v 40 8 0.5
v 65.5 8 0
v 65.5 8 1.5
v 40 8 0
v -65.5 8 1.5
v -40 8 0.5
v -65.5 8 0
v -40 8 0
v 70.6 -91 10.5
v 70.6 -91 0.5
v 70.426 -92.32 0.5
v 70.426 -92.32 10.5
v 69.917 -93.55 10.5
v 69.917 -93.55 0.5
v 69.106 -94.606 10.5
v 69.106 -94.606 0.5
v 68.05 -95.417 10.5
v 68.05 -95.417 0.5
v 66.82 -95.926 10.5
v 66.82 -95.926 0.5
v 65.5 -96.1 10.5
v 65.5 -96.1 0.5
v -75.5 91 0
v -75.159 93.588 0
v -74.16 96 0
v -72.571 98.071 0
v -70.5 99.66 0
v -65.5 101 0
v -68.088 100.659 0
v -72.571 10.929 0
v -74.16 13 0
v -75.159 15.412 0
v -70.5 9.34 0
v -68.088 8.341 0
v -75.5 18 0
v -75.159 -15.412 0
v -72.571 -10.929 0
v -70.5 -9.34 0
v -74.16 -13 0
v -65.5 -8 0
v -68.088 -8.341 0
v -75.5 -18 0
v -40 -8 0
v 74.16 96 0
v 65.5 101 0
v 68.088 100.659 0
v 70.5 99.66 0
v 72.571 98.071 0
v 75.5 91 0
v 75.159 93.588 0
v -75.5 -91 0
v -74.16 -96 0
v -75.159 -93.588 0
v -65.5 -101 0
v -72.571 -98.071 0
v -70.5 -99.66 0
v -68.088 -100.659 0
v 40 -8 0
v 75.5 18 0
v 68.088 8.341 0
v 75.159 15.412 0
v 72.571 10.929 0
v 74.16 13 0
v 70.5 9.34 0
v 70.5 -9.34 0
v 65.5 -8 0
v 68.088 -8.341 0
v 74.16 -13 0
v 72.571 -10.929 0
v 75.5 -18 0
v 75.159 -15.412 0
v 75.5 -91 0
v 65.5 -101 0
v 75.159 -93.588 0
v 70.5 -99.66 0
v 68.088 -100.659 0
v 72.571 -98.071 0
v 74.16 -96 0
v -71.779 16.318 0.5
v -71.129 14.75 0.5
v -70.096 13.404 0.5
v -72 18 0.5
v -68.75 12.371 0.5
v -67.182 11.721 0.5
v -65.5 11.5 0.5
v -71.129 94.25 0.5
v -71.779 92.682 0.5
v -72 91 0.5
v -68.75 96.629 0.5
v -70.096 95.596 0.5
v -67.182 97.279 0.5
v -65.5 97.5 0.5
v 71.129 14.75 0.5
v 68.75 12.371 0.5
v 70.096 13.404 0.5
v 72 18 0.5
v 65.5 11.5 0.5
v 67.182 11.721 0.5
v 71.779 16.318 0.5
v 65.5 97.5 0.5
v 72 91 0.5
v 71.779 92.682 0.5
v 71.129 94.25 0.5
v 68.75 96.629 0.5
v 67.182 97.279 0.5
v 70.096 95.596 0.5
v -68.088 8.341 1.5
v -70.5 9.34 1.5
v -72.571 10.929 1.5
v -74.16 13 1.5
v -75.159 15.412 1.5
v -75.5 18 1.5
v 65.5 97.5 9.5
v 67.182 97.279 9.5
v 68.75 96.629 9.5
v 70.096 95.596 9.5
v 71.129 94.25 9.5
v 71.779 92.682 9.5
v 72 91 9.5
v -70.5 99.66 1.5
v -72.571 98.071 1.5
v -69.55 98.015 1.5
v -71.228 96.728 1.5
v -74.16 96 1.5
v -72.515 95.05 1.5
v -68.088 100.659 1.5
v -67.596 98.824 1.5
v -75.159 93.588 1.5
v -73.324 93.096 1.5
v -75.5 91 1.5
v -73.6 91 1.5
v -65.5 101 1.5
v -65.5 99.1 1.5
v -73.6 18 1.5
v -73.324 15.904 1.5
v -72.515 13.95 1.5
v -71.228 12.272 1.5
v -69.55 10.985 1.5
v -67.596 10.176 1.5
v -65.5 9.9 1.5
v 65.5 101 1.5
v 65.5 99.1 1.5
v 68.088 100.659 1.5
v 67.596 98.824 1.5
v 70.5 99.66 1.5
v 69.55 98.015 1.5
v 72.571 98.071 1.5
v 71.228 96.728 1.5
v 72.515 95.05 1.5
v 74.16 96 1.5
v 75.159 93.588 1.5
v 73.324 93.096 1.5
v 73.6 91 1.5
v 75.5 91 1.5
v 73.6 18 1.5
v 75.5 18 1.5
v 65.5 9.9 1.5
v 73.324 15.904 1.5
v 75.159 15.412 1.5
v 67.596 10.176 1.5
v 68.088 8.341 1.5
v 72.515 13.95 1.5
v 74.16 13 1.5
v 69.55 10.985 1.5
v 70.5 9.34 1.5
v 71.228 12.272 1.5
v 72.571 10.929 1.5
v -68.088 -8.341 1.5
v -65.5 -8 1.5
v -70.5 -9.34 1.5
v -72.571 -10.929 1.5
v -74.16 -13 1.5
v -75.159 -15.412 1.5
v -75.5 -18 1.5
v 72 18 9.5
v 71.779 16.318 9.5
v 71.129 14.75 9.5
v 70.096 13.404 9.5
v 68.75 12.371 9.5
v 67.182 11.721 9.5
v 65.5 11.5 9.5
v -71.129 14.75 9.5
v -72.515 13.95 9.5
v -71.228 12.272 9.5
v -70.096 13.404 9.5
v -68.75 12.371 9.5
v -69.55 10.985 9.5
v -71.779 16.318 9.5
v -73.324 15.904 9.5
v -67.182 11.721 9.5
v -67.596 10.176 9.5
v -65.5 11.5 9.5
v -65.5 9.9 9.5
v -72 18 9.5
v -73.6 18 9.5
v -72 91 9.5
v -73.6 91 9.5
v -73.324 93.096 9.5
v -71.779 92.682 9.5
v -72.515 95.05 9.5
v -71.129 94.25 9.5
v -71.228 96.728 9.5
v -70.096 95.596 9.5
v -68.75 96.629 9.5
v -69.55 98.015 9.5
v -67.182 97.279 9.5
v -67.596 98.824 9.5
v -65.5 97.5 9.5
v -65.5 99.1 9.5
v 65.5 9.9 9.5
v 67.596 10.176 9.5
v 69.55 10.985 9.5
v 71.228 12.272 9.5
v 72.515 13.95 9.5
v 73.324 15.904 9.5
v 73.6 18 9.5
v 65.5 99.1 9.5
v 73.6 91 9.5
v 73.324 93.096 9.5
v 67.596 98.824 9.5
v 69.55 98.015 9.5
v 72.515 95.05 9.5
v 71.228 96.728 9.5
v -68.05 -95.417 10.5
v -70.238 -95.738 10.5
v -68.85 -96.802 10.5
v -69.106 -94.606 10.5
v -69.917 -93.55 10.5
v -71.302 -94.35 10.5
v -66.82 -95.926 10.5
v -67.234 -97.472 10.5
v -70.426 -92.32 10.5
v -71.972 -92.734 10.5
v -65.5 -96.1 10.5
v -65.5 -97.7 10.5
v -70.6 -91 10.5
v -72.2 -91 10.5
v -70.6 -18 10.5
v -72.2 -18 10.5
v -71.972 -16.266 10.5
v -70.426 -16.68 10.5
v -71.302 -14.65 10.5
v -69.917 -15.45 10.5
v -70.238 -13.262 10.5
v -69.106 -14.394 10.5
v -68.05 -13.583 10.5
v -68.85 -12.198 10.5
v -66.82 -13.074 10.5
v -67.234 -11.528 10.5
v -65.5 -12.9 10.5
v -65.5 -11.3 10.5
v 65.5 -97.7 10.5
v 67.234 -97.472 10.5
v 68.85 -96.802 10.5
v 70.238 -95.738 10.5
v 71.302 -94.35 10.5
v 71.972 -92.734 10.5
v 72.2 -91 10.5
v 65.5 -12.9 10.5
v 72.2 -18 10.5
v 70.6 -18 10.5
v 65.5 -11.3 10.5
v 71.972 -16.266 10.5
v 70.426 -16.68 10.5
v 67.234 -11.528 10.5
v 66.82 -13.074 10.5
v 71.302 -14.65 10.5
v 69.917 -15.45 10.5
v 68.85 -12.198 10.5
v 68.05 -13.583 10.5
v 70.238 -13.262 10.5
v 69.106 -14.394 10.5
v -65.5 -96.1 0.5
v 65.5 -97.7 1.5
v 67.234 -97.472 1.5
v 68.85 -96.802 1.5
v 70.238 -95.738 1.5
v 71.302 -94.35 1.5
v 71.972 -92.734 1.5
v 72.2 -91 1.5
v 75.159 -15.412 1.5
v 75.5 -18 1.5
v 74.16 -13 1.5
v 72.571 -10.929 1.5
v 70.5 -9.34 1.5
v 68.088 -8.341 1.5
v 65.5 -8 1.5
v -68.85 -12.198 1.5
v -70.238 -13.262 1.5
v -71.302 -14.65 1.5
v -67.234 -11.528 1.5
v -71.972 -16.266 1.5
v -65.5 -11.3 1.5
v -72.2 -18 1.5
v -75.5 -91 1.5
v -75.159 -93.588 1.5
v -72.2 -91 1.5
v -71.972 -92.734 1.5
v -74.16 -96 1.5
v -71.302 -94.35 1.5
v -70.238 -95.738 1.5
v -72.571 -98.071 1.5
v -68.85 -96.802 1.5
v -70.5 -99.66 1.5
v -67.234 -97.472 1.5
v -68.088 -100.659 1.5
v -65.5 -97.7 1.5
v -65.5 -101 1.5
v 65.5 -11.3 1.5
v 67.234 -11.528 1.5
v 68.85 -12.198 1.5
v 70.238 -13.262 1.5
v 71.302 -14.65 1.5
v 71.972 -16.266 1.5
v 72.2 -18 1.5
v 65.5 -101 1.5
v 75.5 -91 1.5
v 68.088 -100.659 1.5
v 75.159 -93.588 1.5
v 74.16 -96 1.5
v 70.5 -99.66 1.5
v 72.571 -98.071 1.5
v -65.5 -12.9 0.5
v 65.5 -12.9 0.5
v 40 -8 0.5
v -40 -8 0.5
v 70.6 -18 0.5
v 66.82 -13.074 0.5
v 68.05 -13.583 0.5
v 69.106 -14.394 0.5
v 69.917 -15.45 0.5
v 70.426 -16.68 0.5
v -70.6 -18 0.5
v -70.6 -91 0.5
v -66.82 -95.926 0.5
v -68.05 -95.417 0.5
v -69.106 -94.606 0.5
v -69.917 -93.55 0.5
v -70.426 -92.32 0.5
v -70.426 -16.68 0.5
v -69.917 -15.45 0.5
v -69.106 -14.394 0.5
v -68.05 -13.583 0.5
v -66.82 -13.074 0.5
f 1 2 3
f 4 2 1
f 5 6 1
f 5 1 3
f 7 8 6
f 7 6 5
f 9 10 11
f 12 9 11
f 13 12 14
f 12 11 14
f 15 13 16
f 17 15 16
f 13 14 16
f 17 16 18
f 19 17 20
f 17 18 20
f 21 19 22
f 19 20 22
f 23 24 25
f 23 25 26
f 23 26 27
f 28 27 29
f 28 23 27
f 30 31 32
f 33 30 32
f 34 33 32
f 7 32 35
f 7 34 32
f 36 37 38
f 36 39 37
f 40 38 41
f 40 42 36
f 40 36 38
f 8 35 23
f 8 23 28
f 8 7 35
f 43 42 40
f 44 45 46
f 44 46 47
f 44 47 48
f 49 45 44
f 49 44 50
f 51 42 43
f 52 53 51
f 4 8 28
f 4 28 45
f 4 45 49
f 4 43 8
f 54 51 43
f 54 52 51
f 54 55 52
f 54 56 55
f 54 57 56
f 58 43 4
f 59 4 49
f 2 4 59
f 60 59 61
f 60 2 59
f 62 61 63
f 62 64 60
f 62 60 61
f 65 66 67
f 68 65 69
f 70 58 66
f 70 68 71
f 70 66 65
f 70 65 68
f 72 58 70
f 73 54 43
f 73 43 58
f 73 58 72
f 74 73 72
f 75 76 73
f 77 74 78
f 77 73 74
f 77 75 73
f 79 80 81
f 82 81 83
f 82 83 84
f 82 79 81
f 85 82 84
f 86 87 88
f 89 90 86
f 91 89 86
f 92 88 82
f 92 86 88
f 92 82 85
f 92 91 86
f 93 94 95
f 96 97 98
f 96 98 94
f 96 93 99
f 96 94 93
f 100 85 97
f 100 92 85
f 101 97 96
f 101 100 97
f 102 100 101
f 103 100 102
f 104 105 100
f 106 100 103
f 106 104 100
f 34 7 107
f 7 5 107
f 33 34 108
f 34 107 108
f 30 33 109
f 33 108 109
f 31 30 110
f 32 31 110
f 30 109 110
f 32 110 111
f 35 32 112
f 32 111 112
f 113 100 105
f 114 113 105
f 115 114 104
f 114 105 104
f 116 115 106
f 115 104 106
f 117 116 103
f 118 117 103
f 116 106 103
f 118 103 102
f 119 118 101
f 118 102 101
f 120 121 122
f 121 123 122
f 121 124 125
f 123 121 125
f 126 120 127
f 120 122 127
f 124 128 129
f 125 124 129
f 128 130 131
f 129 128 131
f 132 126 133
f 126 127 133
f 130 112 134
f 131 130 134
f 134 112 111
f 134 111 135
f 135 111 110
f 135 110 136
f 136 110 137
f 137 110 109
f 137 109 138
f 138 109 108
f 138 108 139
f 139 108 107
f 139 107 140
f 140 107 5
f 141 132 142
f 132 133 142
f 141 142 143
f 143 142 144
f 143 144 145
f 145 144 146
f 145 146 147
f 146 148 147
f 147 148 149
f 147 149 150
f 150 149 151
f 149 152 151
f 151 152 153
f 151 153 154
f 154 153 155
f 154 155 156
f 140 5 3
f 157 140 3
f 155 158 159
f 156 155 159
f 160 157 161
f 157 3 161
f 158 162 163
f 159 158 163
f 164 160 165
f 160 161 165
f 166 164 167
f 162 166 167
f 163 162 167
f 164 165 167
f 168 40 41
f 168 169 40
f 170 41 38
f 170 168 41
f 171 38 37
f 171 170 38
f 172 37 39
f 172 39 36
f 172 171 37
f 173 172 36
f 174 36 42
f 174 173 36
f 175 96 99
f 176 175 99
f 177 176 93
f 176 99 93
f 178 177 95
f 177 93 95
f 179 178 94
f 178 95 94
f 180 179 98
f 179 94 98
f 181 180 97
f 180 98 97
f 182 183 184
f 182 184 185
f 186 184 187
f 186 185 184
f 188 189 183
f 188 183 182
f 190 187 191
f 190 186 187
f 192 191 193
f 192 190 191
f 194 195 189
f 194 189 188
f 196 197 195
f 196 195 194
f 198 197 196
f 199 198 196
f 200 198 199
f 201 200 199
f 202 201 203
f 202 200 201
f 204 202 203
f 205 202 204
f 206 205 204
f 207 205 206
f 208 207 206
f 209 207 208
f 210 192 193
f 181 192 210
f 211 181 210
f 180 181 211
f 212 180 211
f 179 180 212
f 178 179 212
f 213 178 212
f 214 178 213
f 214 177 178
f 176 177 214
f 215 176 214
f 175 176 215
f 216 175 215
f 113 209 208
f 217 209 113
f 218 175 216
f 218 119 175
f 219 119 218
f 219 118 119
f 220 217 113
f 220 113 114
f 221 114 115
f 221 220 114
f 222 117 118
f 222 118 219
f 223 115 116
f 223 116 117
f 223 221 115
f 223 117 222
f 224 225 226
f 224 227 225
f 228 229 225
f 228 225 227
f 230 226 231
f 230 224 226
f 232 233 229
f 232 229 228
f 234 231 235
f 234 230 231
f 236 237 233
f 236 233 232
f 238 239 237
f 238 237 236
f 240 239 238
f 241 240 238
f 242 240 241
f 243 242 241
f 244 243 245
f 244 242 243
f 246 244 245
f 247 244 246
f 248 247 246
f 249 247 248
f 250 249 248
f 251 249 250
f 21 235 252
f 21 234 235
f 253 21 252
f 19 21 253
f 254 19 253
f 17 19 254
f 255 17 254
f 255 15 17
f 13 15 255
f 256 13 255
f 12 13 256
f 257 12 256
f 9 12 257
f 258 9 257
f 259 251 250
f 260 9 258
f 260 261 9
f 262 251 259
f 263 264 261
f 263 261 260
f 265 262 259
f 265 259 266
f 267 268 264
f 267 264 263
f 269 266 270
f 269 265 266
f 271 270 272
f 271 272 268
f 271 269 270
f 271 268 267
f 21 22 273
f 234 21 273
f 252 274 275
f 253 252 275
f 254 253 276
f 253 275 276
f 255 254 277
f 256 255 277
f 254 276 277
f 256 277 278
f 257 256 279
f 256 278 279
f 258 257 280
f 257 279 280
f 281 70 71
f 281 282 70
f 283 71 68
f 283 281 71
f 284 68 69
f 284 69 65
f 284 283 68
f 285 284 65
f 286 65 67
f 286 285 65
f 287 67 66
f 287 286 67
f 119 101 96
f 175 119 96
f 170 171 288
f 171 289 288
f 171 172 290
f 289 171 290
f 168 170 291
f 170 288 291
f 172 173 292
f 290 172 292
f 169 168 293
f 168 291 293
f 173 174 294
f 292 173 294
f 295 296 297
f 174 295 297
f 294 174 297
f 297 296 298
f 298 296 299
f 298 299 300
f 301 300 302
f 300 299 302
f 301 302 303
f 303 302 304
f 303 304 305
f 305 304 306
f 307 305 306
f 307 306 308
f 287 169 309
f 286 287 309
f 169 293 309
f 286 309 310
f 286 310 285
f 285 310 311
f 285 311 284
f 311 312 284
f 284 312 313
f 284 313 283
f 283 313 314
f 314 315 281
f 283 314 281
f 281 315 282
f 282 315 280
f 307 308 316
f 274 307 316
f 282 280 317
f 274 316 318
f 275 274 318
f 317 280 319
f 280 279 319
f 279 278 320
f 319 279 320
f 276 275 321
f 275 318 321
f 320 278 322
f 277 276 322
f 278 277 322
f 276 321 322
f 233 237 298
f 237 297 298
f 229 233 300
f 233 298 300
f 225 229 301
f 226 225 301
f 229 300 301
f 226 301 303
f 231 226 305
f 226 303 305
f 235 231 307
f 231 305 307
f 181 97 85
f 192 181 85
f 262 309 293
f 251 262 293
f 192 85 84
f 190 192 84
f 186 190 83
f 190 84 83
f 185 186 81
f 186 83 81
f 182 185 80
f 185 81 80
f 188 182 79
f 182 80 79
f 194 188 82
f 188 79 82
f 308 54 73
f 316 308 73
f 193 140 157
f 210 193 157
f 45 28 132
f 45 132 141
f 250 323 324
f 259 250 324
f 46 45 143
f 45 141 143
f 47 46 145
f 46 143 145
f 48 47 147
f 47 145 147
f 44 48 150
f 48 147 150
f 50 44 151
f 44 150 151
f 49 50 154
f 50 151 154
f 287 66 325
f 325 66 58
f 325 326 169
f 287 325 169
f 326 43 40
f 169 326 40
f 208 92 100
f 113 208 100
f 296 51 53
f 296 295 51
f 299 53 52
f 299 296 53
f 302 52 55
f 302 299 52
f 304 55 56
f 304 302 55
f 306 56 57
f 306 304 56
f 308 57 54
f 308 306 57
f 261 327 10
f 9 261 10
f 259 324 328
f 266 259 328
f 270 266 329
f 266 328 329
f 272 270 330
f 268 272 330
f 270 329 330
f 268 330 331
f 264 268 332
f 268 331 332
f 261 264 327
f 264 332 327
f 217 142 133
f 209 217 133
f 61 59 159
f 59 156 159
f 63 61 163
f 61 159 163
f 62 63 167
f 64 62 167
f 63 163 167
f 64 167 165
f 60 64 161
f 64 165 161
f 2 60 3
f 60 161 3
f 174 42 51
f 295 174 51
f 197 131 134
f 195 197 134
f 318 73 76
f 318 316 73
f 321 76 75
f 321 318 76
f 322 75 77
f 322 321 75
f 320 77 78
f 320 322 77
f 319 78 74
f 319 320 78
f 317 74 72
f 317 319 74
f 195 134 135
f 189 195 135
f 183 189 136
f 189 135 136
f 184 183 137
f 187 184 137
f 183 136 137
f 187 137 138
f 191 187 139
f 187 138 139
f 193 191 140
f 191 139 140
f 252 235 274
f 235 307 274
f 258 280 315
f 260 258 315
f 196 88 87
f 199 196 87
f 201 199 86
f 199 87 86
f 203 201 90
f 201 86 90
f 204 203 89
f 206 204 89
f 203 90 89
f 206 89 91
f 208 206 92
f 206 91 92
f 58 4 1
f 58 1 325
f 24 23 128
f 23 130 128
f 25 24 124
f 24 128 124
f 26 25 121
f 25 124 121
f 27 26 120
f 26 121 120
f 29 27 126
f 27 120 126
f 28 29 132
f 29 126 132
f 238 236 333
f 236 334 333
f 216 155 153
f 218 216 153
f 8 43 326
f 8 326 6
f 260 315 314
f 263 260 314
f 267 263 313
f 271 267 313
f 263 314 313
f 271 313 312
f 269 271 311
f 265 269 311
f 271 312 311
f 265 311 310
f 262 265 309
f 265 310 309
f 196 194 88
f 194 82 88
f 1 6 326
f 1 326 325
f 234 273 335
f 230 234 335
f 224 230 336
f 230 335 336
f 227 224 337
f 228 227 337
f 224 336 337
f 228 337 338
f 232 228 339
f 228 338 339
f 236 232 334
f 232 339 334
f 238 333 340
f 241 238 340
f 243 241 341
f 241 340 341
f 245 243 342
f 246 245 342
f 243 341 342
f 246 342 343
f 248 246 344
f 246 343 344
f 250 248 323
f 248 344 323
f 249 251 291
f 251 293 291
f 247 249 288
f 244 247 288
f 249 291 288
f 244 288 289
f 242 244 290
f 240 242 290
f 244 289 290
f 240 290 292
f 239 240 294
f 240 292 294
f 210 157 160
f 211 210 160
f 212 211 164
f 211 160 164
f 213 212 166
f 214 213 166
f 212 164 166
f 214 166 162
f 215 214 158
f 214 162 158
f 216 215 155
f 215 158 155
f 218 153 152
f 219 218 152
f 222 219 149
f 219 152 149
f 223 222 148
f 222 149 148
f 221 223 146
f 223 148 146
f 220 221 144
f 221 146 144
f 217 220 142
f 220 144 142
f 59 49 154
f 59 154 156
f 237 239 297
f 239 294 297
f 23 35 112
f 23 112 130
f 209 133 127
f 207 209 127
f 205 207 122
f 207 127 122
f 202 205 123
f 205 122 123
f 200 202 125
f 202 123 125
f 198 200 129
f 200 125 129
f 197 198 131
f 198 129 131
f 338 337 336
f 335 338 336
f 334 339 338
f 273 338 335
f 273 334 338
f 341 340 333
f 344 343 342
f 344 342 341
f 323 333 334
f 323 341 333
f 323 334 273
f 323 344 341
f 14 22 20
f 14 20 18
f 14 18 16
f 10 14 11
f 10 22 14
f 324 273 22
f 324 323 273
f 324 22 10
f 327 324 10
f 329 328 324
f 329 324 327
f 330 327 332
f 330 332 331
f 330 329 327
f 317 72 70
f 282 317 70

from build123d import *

# Parameters (mm, degrees)
F1_DEPTH = 1.5
F2_R     = 10
F6_DEPTH = 8
F7_DEPTH = 1
F8_W     = 80
F8_H     = 16
F9_DEPTH = 1


with BuildPart() as f1:
    # F0 (on Top) → F1 (new body)
    with BuildSketch(Plane.XY):
        Polygon((40, 0), (-40, 0), (-40, -8), (-75.5, -8), (-75.5, -101), (75.5, -101), (75.5, -8), (40, -8), align=None)
    extrude(amount=F1_DEPTH)

    # F2
    f2_edges = [f1.edges().sort_by_distance(p)[0] for p in [
        (-75.5, -8, 0.75),
        (-75.5, -101, 0.75),
        (75.5, -101, 0.75),
        (75.5, -8, 0.75),
    ]]
    fillet(f2_edges, radius=F2_R)

    # F3: F1 across face


with BuildPart() as f1_1:
    add(f1.part)
    add(f1.part.mirror(Plane(origin=(0, 0, 0.75), x_dir=(-1, 0, 0), z_dir=(0, 1, 0))))

    # F5 (on face) → F6 (join)
    with BuildSketch(Plane.XY.offset(1.5)):
        with BuildLine():
            Line((65.5, -11.3), (40, -11.3))
            Line((40, -11.3), (-40, -11.3))
            Line((-40, -11.3), (-65.5, -11.3))
            ThreePointArc((-65.5, -11.3), (-70.2376154339, -13.2623845661), (-72.2, -18))
            Line((-72.2, -18), (-72.2, -91))
            ThreePointArc((-72.2, -91), (-70.2376154339, -95.7376154339), (-65.5, -97.7))
            Line((-65.5, -97.7), (65.5, -97.7))
            ThreePointArc((65.5, -97.7), (70.2376154339, -95.7376154339), (72.2, -91))
            Line((72.2, -91), (72.2, -18))
            ThreePointArc((72.2, -18), (70.2376154339, -13.2623845661), (65.5, -11.3))
        make_face()
        with BuildLine():
            Line((-70.6, -91), (-70.6, -18))
            ThreePointArc((-70.6, -18), (-69.1062445841, -14.3937554159), (-65.5, -12.9))
            Line((-65.5, -12.9), (-40, -12.9))
            Line((-40, -12.9), (40, -12.9))
            Line((40, -12.9), (65.5, -12.9))
            ThreePointArc((65.5, -12.9), (69.1062445841, -14.3937554159), (70.6, -18))
            Line((70.6, -18), (70.6, -91))
            ThreePointArc((70.6, -91), (69.1062445841, -94.6062445841), (65.5, -96.1))
            Line((65.5, -96.1), (-65.5, -96.1))
            ThreePointArc((-65.5, -96.1), (-69.1062445841, -94.6062445841), (-70.6, -91))
        make_face(mode=Mode.SUBTRACT)
        with BuildLine():
            ThreePointArc((-73.6, 18), (-71.2275649276, 12.2724350724), (-65.5, 9.9))
            Line((-65.5, 9.9), (-40, 9.9))
            Line((-40, 9.9), (40, 9.9))
            Line((40, 9.9), (65.5, 9.9))
            ThreePointArc((65.5, 9.9), (71.2275649276, 12.2724350724), (73.6, 18))
            Line((73.6, 18), (73.6, 91))
            ThreePointArc((73.6, 91), (71.2275649276, 96.7275649276), (65.5, 99.1))
            Line((65.5, 99.1), (-65.5, 99.1))
            ThreePointArc((-65.5, 99.1), (-71.2275649276, 96.7275649276), (-73.6, 91))
            Line((-73.6, 91), (-73.6, 18))
        make_face()
        with BuildLine():
            Line((-72, 18), (-72, 91))
            ThreePointArc((-72, 91), (-70.0961940777, 95.5961940777), (-65.5, 97.5))
            Line((-65.5, 97.5), (65.5, 97.5))
            ThreePointArc((65.5, 97.5), (70.0961940777, 95.5961940777), (72, 91))
            Line((72, 91), (72, 18))
            ThreePointArc((72, 18), (70.0961940777, 13.4038059223), (65.5, 11.5))
            Line((65.5, 11.5), (40, 11.5))
            Line((40, 11.5), (-40, 11.5))
            Line((-40, 11.5), (-65.5, 11.5))
            ThreePointArc((-65.5, 11.5), (-70.0961940777, 13.4038059223), (-72, 18))
        make_face(mode=Mode.SUBTRACT)
    extrude(amount=F6_DEPTH)

    # F7 (add): a face of the model
    f7_faces = [f1_1.faces().sort_by_distance(p)[0] for p in [
        (0, -11.4682745376, 9.5),
    ]]
    extrude(f7_faces, amount=F7_DEPTH)

    # F8 (on face) → F9 (cut, through all)
    with BuildSketch(Plane.XY.offset(1.5)):
        with BuildLine():
            Line((65.5, 97.5), (-65.5, 97.5))
            ThreePointArc((-65.5, 97.5), (-70.0961940777, 95.5961940777), (-72, 91))
            Line((-72, 91), (-72, 18))
            ThreePointArc((-72, 18), (-70.0961940777, 13.4038059223), (-65.5, 11.5))
            Line((-65.5, 11.5), (65.5, 11.5))
            ThreePointArc((65.5, 11.5), (70.0961940777, 13.4038059223), (72, 18))
            Line((72, 18), (72, 91))
            ThreePointArc((72, 91), (70.0961940777, 95.5961940777), (65.5, 97.5))
        make_face()
        Rectangle(F8_W, F8_H)
        with BuildLine():
            Line((70.6, -91), (70.6, -18))
            ThreePointArc((70.6, -18), (69.1062445841, -14.3937554159), (65.5, -12.9))
            Line((65.5, -12.9), (-65.5, -12.9))
            ThreePointArc((-65.5, -12.9), (-69.1062445841, -14.3937554159), (-70.6, -18))
            Line((-70.6, -18), (-70.6, -91))
            ThreePointArc((-70.6, -91), (-69.1062445841, -94.6062445841), (-65.5, -96.1))
            Line((-65.5, -96.1), (65.5, -96.1))
            ThreePointArc((65.5, -96.1), (69.1062445841, -94.6062445841), (70.6, -91))
        make_face()
    extrude(amount=-F9_DEPTH, mode=Mode.SUBTRACT)


solid = f1_1.part
